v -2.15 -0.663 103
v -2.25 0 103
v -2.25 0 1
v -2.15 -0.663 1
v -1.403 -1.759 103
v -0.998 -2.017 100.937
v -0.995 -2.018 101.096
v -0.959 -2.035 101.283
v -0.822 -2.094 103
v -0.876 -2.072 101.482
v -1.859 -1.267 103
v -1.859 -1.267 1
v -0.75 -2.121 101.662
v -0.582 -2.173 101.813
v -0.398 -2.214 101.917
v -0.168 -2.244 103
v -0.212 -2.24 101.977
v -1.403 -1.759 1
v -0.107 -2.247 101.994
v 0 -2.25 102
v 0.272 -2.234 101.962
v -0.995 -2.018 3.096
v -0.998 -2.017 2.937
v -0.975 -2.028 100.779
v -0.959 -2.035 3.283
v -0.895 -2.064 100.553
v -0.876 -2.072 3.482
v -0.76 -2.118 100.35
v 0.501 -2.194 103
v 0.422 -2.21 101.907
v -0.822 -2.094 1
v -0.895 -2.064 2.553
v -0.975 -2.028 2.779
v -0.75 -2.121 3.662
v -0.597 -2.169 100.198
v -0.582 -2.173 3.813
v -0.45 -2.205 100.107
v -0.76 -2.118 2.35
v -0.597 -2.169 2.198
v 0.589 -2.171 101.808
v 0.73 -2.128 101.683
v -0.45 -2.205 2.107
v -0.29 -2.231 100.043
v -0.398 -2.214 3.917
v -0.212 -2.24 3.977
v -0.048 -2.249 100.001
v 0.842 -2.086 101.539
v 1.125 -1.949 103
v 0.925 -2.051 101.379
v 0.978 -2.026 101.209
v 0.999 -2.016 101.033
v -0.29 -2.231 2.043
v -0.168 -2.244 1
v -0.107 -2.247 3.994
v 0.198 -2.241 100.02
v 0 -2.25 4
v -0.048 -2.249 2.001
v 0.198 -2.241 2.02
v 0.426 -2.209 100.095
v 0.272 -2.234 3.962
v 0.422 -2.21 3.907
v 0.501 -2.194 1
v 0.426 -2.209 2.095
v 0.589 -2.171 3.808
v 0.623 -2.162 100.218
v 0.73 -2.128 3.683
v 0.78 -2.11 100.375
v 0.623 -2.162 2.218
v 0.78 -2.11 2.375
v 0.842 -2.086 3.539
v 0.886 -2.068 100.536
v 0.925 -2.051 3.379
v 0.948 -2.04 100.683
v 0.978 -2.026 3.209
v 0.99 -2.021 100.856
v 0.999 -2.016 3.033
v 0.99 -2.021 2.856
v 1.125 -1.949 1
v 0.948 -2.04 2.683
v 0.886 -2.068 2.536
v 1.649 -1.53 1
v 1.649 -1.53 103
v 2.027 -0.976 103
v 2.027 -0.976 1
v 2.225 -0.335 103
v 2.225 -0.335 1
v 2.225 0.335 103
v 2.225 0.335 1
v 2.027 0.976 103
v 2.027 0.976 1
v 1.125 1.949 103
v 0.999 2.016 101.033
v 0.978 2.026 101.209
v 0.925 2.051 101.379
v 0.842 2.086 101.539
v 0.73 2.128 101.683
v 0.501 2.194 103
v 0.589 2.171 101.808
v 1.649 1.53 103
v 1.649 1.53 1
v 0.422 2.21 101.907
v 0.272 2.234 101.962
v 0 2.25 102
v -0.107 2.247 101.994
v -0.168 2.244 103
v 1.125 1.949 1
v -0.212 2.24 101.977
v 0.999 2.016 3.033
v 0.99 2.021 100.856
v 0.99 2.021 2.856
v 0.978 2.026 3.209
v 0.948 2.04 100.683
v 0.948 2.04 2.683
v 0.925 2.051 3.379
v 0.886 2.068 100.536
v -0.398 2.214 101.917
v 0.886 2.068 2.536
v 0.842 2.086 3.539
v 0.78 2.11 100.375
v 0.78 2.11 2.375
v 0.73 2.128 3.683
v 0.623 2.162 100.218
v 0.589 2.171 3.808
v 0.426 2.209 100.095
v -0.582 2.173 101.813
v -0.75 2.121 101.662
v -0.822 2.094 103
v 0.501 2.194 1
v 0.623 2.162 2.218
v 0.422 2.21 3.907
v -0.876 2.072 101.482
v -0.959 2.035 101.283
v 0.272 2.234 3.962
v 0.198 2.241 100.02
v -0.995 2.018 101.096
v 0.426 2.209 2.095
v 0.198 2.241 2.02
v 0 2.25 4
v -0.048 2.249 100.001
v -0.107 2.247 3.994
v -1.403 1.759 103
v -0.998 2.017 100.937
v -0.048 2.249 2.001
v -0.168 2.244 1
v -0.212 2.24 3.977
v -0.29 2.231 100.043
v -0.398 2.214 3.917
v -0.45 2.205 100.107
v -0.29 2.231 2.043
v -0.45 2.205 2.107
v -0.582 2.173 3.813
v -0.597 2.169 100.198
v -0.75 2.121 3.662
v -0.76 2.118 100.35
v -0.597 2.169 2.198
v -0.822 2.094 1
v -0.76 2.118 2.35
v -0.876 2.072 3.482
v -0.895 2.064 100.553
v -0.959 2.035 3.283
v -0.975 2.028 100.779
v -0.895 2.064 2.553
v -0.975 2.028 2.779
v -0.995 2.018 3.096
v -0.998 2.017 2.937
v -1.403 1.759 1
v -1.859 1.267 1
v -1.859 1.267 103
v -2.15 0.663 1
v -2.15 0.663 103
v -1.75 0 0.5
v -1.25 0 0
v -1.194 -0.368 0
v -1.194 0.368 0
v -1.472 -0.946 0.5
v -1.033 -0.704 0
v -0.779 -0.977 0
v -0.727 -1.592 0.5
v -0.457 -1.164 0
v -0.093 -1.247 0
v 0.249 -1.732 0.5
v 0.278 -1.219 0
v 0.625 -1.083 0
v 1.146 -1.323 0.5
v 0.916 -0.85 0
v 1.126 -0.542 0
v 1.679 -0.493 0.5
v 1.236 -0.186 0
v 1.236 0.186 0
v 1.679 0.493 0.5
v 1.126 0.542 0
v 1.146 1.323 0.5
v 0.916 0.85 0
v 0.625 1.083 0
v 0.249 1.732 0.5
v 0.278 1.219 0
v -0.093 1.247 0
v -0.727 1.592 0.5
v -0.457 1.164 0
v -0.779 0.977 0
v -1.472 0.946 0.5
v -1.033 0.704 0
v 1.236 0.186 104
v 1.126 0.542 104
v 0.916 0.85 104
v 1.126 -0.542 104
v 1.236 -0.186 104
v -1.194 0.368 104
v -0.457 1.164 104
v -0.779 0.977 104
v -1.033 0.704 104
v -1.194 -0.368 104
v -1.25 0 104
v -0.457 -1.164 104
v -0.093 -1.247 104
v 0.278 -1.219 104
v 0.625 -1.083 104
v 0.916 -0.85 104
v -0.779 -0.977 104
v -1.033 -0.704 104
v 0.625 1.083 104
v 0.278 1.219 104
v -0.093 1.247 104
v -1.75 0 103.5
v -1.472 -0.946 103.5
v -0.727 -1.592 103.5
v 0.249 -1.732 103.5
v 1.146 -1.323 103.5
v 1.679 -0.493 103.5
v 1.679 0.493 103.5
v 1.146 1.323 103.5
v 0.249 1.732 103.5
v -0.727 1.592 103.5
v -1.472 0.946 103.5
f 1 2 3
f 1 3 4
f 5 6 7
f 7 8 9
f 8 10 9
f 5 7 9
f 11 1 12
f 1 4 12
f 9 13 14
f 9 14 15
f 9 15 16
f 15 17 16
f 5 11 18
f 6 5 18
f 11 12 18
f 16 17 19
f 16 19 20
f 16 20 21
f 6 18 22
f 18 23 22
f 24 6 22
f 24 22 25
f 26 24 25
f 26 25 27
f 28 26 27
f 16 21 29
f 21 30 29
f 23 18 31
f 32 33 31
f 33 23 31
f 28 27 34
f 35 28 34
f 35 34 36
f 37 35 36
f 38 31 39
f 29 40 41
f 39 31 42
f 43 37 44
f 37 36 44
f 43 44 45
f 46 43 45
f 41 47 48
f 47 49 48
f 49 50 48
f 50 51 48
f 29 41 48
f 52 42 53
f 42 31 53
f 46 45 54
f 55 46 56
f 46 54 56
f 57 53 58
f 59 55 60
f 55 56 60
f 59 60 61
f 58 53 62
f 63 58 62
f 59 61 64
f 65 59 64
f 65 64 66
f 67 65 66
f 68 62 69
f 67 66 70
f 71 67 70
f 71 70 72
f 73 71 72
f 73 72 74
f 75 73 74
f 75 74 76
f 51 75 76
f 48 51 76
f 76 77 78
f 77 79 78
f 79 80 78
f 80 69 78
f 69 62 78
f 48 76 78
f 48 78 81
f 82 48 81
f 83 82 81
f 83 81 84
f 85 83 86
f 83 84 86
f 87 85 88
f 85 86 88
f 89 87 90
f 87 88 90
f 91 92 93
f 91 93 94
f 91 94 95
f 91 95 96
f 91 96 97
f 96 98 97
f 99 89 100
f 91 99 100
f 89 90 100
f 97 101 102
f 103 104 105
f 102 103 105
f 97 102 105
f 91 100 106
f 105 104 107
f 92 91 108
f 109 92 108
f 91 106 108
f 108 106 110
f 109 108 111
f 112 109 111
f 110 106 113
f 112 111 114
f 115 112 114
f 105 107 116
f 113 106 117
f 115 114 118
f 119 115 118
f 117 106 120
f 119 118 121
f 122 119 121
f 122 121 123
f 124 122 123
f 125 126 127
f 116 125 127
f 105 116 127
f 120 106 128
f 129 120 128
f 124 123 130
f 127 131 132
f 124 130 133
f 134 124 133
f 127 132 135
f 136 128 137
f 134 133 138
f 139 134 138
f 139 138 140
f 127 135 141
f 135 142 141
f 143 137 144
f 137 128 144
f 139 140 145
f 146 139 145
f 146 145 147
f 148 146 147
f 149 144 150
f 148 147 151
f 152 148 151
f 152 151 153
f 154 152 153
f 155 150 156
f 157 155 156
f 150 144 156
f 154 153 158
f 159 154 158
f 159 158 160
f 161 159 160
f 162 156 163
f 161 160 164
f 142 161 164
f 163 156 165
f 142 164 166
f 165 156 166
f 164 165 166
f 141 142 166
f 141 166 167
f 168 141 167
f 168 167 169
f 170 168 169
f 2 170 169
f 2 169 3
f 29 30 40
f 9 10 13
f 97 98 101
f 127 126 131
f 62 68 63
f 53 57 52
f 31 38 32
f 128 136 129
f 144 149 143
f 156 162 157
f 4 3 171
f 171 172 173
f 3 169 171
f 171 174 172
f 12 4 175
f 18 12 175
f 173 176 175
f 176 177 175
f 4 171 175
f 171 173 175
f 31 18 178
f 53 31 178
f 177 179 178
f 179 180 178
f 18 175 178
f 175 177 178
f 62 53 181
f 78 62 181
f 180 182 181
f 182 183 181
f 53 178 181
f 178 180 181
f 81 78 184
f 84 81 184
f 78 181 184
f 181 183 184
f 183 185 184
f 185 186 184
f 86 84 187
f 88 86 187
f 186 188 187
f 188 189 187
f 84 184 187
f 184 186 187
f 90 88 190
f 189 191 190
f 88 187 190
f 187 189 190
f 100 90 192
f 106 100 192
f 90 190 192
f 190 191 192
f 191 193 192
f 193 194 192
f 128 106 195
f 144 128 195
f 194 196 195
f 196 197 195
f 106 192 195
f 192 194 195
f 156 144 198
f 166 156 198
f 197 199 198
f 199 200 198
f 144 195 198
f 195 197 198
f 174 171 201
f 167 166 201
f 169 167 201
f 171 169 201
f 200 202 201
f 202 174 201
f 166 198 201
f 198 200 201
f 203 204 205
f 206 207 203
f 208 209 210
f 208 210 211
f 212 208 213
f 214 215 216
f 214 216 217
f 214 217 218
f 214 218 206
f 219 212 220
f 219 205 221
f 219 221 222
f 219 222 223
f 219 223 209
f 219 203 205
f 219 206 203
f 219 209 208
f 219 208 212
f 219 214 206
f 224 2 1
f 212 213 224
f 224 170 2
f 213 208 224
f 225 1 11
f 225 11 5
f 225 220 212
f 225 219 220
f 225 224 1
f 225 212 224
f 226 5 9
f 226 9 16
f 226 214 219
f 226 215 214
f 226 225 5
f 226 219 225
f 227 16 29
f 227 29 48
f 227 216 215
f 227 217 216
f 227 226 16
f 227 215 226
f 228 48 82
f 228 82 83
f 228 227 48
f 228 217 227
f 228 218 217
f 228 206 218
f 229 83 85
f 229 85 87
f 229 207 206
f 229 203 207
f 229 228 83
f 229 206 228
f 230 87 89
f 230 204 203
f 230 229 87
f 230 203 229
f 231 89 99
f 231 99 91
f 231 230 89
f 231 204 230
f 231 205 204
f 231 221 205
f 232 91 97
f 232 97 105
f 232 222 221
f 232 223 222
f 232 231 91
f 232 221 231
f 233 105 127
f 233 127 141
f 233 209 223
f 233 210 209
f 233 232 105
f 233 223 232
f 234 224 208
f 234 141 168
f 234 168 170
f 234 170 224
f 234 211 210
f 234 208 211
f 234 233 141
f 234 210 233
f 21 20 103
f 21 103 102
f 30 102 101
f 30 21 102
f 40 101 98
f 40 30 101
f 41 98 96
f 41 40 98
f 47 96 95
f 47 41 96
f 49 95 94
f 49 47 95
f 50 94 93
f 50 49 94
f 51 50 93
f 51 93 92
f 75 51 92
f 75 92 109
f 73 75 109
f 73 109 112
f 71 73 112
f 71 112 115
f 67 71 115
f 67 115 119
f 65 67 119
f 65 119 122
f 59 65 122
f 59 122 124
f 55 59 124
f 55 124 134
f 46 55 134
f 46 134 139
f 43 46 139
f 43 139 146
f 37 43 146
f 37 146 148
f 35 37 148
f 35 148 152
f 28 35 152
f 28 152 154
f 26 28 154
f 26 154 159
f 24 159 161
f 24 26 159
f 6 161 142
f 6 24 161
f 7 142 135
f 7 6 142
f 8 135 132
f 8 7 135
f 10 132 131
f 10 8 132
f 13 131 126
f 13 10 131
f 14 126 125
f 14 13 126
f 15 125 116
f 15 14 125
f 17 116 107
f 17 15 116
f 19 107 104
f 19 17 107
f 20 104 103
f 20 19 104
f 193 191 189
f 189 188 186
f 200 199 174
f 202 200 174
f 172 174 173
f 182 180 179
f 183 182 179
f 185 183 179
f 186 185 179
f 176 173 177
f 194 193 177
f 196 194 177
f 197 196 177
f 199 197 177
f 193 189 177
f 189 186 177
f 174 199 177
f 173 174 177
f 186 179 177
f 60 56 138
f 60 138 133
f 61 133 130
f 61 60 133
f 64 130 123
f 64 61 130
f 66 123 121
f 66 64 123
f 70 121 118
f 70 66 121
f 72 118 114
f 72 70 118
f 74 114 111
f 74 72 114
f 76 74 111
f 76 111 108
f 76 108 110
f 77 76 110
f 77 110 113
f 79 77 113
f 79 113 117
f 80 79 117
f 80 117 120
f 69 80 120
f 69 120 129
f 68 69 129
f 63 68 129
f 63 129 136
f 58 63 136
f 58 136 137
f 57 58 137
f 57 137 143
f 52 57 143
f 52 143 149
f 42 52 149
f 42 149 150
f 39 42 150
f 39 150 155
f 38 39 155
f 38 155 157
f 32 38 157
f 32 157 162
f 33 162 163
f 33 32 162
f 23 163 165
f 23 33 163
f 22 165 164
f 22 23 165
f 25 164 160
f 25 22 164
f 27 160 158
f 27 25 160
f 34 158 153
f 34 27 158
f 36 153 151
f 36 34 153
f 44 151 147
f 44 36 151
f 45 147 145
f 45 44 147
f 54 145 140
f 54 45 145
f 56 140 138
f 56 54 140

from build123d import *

# Parameters (mm, degrees)
SKETCH_1_R               = 2.25
EXTRUDE_1_DEPTH          = 104
CHAMFER_1_SIZE           = 1
CUT_EXTRUDE_1_DEPTH      = 105.048666498
CUT_EXTRUDE_1_DEPTH_BACK = 105.048666498
SKETCH_2_R               = 1


with BuildPart() as part:
    # 草圖1 → 填料-伸長1 (new body)
    with BuildSketch(Plane.XY):
        with Locations(Location((0, 0, 0), (0, 0, 180))):
            Circle(SKETCH_1_R)
    extrude(amount=EXTRUDE_1_DEPTH)

    # 導角1
    chamfer_1_edges = [part.edges().sort_by_distance(p)[0] for p in [
        (2.25, 0, 0),
        (2.25, 0, 104),
    ]]
    chamfer(chamfer_1_edges, length=CHAMFER_1_SIZE)

    # 草圖2 → 除料-伸長1 (cut, two sides: drawn at the far end of the back side and taken through both)
    with BuildSketch(Plane(origin=(0, 0, 0), x_dir=(1, 0, 0), z_dir=(0, 1, 0)).offset(-CUT_EXTRUDE_1_DEPTH_BACK)):
        with Locations(Location((0, -3, 0), (0, 0, 270))):
            Circle(SKETCH_2_R)
        with Locations(Location((0, -101, 0), (0, 0, 270))):
            Circle(SKETCH_2_R)
    extrude(amount=CUT_EXTRUDE_1_DEPTH + CUT_EXTRUDE_1_DEPTH_BACK, mode=Mode.SUBTRACT)


solid = part.part
